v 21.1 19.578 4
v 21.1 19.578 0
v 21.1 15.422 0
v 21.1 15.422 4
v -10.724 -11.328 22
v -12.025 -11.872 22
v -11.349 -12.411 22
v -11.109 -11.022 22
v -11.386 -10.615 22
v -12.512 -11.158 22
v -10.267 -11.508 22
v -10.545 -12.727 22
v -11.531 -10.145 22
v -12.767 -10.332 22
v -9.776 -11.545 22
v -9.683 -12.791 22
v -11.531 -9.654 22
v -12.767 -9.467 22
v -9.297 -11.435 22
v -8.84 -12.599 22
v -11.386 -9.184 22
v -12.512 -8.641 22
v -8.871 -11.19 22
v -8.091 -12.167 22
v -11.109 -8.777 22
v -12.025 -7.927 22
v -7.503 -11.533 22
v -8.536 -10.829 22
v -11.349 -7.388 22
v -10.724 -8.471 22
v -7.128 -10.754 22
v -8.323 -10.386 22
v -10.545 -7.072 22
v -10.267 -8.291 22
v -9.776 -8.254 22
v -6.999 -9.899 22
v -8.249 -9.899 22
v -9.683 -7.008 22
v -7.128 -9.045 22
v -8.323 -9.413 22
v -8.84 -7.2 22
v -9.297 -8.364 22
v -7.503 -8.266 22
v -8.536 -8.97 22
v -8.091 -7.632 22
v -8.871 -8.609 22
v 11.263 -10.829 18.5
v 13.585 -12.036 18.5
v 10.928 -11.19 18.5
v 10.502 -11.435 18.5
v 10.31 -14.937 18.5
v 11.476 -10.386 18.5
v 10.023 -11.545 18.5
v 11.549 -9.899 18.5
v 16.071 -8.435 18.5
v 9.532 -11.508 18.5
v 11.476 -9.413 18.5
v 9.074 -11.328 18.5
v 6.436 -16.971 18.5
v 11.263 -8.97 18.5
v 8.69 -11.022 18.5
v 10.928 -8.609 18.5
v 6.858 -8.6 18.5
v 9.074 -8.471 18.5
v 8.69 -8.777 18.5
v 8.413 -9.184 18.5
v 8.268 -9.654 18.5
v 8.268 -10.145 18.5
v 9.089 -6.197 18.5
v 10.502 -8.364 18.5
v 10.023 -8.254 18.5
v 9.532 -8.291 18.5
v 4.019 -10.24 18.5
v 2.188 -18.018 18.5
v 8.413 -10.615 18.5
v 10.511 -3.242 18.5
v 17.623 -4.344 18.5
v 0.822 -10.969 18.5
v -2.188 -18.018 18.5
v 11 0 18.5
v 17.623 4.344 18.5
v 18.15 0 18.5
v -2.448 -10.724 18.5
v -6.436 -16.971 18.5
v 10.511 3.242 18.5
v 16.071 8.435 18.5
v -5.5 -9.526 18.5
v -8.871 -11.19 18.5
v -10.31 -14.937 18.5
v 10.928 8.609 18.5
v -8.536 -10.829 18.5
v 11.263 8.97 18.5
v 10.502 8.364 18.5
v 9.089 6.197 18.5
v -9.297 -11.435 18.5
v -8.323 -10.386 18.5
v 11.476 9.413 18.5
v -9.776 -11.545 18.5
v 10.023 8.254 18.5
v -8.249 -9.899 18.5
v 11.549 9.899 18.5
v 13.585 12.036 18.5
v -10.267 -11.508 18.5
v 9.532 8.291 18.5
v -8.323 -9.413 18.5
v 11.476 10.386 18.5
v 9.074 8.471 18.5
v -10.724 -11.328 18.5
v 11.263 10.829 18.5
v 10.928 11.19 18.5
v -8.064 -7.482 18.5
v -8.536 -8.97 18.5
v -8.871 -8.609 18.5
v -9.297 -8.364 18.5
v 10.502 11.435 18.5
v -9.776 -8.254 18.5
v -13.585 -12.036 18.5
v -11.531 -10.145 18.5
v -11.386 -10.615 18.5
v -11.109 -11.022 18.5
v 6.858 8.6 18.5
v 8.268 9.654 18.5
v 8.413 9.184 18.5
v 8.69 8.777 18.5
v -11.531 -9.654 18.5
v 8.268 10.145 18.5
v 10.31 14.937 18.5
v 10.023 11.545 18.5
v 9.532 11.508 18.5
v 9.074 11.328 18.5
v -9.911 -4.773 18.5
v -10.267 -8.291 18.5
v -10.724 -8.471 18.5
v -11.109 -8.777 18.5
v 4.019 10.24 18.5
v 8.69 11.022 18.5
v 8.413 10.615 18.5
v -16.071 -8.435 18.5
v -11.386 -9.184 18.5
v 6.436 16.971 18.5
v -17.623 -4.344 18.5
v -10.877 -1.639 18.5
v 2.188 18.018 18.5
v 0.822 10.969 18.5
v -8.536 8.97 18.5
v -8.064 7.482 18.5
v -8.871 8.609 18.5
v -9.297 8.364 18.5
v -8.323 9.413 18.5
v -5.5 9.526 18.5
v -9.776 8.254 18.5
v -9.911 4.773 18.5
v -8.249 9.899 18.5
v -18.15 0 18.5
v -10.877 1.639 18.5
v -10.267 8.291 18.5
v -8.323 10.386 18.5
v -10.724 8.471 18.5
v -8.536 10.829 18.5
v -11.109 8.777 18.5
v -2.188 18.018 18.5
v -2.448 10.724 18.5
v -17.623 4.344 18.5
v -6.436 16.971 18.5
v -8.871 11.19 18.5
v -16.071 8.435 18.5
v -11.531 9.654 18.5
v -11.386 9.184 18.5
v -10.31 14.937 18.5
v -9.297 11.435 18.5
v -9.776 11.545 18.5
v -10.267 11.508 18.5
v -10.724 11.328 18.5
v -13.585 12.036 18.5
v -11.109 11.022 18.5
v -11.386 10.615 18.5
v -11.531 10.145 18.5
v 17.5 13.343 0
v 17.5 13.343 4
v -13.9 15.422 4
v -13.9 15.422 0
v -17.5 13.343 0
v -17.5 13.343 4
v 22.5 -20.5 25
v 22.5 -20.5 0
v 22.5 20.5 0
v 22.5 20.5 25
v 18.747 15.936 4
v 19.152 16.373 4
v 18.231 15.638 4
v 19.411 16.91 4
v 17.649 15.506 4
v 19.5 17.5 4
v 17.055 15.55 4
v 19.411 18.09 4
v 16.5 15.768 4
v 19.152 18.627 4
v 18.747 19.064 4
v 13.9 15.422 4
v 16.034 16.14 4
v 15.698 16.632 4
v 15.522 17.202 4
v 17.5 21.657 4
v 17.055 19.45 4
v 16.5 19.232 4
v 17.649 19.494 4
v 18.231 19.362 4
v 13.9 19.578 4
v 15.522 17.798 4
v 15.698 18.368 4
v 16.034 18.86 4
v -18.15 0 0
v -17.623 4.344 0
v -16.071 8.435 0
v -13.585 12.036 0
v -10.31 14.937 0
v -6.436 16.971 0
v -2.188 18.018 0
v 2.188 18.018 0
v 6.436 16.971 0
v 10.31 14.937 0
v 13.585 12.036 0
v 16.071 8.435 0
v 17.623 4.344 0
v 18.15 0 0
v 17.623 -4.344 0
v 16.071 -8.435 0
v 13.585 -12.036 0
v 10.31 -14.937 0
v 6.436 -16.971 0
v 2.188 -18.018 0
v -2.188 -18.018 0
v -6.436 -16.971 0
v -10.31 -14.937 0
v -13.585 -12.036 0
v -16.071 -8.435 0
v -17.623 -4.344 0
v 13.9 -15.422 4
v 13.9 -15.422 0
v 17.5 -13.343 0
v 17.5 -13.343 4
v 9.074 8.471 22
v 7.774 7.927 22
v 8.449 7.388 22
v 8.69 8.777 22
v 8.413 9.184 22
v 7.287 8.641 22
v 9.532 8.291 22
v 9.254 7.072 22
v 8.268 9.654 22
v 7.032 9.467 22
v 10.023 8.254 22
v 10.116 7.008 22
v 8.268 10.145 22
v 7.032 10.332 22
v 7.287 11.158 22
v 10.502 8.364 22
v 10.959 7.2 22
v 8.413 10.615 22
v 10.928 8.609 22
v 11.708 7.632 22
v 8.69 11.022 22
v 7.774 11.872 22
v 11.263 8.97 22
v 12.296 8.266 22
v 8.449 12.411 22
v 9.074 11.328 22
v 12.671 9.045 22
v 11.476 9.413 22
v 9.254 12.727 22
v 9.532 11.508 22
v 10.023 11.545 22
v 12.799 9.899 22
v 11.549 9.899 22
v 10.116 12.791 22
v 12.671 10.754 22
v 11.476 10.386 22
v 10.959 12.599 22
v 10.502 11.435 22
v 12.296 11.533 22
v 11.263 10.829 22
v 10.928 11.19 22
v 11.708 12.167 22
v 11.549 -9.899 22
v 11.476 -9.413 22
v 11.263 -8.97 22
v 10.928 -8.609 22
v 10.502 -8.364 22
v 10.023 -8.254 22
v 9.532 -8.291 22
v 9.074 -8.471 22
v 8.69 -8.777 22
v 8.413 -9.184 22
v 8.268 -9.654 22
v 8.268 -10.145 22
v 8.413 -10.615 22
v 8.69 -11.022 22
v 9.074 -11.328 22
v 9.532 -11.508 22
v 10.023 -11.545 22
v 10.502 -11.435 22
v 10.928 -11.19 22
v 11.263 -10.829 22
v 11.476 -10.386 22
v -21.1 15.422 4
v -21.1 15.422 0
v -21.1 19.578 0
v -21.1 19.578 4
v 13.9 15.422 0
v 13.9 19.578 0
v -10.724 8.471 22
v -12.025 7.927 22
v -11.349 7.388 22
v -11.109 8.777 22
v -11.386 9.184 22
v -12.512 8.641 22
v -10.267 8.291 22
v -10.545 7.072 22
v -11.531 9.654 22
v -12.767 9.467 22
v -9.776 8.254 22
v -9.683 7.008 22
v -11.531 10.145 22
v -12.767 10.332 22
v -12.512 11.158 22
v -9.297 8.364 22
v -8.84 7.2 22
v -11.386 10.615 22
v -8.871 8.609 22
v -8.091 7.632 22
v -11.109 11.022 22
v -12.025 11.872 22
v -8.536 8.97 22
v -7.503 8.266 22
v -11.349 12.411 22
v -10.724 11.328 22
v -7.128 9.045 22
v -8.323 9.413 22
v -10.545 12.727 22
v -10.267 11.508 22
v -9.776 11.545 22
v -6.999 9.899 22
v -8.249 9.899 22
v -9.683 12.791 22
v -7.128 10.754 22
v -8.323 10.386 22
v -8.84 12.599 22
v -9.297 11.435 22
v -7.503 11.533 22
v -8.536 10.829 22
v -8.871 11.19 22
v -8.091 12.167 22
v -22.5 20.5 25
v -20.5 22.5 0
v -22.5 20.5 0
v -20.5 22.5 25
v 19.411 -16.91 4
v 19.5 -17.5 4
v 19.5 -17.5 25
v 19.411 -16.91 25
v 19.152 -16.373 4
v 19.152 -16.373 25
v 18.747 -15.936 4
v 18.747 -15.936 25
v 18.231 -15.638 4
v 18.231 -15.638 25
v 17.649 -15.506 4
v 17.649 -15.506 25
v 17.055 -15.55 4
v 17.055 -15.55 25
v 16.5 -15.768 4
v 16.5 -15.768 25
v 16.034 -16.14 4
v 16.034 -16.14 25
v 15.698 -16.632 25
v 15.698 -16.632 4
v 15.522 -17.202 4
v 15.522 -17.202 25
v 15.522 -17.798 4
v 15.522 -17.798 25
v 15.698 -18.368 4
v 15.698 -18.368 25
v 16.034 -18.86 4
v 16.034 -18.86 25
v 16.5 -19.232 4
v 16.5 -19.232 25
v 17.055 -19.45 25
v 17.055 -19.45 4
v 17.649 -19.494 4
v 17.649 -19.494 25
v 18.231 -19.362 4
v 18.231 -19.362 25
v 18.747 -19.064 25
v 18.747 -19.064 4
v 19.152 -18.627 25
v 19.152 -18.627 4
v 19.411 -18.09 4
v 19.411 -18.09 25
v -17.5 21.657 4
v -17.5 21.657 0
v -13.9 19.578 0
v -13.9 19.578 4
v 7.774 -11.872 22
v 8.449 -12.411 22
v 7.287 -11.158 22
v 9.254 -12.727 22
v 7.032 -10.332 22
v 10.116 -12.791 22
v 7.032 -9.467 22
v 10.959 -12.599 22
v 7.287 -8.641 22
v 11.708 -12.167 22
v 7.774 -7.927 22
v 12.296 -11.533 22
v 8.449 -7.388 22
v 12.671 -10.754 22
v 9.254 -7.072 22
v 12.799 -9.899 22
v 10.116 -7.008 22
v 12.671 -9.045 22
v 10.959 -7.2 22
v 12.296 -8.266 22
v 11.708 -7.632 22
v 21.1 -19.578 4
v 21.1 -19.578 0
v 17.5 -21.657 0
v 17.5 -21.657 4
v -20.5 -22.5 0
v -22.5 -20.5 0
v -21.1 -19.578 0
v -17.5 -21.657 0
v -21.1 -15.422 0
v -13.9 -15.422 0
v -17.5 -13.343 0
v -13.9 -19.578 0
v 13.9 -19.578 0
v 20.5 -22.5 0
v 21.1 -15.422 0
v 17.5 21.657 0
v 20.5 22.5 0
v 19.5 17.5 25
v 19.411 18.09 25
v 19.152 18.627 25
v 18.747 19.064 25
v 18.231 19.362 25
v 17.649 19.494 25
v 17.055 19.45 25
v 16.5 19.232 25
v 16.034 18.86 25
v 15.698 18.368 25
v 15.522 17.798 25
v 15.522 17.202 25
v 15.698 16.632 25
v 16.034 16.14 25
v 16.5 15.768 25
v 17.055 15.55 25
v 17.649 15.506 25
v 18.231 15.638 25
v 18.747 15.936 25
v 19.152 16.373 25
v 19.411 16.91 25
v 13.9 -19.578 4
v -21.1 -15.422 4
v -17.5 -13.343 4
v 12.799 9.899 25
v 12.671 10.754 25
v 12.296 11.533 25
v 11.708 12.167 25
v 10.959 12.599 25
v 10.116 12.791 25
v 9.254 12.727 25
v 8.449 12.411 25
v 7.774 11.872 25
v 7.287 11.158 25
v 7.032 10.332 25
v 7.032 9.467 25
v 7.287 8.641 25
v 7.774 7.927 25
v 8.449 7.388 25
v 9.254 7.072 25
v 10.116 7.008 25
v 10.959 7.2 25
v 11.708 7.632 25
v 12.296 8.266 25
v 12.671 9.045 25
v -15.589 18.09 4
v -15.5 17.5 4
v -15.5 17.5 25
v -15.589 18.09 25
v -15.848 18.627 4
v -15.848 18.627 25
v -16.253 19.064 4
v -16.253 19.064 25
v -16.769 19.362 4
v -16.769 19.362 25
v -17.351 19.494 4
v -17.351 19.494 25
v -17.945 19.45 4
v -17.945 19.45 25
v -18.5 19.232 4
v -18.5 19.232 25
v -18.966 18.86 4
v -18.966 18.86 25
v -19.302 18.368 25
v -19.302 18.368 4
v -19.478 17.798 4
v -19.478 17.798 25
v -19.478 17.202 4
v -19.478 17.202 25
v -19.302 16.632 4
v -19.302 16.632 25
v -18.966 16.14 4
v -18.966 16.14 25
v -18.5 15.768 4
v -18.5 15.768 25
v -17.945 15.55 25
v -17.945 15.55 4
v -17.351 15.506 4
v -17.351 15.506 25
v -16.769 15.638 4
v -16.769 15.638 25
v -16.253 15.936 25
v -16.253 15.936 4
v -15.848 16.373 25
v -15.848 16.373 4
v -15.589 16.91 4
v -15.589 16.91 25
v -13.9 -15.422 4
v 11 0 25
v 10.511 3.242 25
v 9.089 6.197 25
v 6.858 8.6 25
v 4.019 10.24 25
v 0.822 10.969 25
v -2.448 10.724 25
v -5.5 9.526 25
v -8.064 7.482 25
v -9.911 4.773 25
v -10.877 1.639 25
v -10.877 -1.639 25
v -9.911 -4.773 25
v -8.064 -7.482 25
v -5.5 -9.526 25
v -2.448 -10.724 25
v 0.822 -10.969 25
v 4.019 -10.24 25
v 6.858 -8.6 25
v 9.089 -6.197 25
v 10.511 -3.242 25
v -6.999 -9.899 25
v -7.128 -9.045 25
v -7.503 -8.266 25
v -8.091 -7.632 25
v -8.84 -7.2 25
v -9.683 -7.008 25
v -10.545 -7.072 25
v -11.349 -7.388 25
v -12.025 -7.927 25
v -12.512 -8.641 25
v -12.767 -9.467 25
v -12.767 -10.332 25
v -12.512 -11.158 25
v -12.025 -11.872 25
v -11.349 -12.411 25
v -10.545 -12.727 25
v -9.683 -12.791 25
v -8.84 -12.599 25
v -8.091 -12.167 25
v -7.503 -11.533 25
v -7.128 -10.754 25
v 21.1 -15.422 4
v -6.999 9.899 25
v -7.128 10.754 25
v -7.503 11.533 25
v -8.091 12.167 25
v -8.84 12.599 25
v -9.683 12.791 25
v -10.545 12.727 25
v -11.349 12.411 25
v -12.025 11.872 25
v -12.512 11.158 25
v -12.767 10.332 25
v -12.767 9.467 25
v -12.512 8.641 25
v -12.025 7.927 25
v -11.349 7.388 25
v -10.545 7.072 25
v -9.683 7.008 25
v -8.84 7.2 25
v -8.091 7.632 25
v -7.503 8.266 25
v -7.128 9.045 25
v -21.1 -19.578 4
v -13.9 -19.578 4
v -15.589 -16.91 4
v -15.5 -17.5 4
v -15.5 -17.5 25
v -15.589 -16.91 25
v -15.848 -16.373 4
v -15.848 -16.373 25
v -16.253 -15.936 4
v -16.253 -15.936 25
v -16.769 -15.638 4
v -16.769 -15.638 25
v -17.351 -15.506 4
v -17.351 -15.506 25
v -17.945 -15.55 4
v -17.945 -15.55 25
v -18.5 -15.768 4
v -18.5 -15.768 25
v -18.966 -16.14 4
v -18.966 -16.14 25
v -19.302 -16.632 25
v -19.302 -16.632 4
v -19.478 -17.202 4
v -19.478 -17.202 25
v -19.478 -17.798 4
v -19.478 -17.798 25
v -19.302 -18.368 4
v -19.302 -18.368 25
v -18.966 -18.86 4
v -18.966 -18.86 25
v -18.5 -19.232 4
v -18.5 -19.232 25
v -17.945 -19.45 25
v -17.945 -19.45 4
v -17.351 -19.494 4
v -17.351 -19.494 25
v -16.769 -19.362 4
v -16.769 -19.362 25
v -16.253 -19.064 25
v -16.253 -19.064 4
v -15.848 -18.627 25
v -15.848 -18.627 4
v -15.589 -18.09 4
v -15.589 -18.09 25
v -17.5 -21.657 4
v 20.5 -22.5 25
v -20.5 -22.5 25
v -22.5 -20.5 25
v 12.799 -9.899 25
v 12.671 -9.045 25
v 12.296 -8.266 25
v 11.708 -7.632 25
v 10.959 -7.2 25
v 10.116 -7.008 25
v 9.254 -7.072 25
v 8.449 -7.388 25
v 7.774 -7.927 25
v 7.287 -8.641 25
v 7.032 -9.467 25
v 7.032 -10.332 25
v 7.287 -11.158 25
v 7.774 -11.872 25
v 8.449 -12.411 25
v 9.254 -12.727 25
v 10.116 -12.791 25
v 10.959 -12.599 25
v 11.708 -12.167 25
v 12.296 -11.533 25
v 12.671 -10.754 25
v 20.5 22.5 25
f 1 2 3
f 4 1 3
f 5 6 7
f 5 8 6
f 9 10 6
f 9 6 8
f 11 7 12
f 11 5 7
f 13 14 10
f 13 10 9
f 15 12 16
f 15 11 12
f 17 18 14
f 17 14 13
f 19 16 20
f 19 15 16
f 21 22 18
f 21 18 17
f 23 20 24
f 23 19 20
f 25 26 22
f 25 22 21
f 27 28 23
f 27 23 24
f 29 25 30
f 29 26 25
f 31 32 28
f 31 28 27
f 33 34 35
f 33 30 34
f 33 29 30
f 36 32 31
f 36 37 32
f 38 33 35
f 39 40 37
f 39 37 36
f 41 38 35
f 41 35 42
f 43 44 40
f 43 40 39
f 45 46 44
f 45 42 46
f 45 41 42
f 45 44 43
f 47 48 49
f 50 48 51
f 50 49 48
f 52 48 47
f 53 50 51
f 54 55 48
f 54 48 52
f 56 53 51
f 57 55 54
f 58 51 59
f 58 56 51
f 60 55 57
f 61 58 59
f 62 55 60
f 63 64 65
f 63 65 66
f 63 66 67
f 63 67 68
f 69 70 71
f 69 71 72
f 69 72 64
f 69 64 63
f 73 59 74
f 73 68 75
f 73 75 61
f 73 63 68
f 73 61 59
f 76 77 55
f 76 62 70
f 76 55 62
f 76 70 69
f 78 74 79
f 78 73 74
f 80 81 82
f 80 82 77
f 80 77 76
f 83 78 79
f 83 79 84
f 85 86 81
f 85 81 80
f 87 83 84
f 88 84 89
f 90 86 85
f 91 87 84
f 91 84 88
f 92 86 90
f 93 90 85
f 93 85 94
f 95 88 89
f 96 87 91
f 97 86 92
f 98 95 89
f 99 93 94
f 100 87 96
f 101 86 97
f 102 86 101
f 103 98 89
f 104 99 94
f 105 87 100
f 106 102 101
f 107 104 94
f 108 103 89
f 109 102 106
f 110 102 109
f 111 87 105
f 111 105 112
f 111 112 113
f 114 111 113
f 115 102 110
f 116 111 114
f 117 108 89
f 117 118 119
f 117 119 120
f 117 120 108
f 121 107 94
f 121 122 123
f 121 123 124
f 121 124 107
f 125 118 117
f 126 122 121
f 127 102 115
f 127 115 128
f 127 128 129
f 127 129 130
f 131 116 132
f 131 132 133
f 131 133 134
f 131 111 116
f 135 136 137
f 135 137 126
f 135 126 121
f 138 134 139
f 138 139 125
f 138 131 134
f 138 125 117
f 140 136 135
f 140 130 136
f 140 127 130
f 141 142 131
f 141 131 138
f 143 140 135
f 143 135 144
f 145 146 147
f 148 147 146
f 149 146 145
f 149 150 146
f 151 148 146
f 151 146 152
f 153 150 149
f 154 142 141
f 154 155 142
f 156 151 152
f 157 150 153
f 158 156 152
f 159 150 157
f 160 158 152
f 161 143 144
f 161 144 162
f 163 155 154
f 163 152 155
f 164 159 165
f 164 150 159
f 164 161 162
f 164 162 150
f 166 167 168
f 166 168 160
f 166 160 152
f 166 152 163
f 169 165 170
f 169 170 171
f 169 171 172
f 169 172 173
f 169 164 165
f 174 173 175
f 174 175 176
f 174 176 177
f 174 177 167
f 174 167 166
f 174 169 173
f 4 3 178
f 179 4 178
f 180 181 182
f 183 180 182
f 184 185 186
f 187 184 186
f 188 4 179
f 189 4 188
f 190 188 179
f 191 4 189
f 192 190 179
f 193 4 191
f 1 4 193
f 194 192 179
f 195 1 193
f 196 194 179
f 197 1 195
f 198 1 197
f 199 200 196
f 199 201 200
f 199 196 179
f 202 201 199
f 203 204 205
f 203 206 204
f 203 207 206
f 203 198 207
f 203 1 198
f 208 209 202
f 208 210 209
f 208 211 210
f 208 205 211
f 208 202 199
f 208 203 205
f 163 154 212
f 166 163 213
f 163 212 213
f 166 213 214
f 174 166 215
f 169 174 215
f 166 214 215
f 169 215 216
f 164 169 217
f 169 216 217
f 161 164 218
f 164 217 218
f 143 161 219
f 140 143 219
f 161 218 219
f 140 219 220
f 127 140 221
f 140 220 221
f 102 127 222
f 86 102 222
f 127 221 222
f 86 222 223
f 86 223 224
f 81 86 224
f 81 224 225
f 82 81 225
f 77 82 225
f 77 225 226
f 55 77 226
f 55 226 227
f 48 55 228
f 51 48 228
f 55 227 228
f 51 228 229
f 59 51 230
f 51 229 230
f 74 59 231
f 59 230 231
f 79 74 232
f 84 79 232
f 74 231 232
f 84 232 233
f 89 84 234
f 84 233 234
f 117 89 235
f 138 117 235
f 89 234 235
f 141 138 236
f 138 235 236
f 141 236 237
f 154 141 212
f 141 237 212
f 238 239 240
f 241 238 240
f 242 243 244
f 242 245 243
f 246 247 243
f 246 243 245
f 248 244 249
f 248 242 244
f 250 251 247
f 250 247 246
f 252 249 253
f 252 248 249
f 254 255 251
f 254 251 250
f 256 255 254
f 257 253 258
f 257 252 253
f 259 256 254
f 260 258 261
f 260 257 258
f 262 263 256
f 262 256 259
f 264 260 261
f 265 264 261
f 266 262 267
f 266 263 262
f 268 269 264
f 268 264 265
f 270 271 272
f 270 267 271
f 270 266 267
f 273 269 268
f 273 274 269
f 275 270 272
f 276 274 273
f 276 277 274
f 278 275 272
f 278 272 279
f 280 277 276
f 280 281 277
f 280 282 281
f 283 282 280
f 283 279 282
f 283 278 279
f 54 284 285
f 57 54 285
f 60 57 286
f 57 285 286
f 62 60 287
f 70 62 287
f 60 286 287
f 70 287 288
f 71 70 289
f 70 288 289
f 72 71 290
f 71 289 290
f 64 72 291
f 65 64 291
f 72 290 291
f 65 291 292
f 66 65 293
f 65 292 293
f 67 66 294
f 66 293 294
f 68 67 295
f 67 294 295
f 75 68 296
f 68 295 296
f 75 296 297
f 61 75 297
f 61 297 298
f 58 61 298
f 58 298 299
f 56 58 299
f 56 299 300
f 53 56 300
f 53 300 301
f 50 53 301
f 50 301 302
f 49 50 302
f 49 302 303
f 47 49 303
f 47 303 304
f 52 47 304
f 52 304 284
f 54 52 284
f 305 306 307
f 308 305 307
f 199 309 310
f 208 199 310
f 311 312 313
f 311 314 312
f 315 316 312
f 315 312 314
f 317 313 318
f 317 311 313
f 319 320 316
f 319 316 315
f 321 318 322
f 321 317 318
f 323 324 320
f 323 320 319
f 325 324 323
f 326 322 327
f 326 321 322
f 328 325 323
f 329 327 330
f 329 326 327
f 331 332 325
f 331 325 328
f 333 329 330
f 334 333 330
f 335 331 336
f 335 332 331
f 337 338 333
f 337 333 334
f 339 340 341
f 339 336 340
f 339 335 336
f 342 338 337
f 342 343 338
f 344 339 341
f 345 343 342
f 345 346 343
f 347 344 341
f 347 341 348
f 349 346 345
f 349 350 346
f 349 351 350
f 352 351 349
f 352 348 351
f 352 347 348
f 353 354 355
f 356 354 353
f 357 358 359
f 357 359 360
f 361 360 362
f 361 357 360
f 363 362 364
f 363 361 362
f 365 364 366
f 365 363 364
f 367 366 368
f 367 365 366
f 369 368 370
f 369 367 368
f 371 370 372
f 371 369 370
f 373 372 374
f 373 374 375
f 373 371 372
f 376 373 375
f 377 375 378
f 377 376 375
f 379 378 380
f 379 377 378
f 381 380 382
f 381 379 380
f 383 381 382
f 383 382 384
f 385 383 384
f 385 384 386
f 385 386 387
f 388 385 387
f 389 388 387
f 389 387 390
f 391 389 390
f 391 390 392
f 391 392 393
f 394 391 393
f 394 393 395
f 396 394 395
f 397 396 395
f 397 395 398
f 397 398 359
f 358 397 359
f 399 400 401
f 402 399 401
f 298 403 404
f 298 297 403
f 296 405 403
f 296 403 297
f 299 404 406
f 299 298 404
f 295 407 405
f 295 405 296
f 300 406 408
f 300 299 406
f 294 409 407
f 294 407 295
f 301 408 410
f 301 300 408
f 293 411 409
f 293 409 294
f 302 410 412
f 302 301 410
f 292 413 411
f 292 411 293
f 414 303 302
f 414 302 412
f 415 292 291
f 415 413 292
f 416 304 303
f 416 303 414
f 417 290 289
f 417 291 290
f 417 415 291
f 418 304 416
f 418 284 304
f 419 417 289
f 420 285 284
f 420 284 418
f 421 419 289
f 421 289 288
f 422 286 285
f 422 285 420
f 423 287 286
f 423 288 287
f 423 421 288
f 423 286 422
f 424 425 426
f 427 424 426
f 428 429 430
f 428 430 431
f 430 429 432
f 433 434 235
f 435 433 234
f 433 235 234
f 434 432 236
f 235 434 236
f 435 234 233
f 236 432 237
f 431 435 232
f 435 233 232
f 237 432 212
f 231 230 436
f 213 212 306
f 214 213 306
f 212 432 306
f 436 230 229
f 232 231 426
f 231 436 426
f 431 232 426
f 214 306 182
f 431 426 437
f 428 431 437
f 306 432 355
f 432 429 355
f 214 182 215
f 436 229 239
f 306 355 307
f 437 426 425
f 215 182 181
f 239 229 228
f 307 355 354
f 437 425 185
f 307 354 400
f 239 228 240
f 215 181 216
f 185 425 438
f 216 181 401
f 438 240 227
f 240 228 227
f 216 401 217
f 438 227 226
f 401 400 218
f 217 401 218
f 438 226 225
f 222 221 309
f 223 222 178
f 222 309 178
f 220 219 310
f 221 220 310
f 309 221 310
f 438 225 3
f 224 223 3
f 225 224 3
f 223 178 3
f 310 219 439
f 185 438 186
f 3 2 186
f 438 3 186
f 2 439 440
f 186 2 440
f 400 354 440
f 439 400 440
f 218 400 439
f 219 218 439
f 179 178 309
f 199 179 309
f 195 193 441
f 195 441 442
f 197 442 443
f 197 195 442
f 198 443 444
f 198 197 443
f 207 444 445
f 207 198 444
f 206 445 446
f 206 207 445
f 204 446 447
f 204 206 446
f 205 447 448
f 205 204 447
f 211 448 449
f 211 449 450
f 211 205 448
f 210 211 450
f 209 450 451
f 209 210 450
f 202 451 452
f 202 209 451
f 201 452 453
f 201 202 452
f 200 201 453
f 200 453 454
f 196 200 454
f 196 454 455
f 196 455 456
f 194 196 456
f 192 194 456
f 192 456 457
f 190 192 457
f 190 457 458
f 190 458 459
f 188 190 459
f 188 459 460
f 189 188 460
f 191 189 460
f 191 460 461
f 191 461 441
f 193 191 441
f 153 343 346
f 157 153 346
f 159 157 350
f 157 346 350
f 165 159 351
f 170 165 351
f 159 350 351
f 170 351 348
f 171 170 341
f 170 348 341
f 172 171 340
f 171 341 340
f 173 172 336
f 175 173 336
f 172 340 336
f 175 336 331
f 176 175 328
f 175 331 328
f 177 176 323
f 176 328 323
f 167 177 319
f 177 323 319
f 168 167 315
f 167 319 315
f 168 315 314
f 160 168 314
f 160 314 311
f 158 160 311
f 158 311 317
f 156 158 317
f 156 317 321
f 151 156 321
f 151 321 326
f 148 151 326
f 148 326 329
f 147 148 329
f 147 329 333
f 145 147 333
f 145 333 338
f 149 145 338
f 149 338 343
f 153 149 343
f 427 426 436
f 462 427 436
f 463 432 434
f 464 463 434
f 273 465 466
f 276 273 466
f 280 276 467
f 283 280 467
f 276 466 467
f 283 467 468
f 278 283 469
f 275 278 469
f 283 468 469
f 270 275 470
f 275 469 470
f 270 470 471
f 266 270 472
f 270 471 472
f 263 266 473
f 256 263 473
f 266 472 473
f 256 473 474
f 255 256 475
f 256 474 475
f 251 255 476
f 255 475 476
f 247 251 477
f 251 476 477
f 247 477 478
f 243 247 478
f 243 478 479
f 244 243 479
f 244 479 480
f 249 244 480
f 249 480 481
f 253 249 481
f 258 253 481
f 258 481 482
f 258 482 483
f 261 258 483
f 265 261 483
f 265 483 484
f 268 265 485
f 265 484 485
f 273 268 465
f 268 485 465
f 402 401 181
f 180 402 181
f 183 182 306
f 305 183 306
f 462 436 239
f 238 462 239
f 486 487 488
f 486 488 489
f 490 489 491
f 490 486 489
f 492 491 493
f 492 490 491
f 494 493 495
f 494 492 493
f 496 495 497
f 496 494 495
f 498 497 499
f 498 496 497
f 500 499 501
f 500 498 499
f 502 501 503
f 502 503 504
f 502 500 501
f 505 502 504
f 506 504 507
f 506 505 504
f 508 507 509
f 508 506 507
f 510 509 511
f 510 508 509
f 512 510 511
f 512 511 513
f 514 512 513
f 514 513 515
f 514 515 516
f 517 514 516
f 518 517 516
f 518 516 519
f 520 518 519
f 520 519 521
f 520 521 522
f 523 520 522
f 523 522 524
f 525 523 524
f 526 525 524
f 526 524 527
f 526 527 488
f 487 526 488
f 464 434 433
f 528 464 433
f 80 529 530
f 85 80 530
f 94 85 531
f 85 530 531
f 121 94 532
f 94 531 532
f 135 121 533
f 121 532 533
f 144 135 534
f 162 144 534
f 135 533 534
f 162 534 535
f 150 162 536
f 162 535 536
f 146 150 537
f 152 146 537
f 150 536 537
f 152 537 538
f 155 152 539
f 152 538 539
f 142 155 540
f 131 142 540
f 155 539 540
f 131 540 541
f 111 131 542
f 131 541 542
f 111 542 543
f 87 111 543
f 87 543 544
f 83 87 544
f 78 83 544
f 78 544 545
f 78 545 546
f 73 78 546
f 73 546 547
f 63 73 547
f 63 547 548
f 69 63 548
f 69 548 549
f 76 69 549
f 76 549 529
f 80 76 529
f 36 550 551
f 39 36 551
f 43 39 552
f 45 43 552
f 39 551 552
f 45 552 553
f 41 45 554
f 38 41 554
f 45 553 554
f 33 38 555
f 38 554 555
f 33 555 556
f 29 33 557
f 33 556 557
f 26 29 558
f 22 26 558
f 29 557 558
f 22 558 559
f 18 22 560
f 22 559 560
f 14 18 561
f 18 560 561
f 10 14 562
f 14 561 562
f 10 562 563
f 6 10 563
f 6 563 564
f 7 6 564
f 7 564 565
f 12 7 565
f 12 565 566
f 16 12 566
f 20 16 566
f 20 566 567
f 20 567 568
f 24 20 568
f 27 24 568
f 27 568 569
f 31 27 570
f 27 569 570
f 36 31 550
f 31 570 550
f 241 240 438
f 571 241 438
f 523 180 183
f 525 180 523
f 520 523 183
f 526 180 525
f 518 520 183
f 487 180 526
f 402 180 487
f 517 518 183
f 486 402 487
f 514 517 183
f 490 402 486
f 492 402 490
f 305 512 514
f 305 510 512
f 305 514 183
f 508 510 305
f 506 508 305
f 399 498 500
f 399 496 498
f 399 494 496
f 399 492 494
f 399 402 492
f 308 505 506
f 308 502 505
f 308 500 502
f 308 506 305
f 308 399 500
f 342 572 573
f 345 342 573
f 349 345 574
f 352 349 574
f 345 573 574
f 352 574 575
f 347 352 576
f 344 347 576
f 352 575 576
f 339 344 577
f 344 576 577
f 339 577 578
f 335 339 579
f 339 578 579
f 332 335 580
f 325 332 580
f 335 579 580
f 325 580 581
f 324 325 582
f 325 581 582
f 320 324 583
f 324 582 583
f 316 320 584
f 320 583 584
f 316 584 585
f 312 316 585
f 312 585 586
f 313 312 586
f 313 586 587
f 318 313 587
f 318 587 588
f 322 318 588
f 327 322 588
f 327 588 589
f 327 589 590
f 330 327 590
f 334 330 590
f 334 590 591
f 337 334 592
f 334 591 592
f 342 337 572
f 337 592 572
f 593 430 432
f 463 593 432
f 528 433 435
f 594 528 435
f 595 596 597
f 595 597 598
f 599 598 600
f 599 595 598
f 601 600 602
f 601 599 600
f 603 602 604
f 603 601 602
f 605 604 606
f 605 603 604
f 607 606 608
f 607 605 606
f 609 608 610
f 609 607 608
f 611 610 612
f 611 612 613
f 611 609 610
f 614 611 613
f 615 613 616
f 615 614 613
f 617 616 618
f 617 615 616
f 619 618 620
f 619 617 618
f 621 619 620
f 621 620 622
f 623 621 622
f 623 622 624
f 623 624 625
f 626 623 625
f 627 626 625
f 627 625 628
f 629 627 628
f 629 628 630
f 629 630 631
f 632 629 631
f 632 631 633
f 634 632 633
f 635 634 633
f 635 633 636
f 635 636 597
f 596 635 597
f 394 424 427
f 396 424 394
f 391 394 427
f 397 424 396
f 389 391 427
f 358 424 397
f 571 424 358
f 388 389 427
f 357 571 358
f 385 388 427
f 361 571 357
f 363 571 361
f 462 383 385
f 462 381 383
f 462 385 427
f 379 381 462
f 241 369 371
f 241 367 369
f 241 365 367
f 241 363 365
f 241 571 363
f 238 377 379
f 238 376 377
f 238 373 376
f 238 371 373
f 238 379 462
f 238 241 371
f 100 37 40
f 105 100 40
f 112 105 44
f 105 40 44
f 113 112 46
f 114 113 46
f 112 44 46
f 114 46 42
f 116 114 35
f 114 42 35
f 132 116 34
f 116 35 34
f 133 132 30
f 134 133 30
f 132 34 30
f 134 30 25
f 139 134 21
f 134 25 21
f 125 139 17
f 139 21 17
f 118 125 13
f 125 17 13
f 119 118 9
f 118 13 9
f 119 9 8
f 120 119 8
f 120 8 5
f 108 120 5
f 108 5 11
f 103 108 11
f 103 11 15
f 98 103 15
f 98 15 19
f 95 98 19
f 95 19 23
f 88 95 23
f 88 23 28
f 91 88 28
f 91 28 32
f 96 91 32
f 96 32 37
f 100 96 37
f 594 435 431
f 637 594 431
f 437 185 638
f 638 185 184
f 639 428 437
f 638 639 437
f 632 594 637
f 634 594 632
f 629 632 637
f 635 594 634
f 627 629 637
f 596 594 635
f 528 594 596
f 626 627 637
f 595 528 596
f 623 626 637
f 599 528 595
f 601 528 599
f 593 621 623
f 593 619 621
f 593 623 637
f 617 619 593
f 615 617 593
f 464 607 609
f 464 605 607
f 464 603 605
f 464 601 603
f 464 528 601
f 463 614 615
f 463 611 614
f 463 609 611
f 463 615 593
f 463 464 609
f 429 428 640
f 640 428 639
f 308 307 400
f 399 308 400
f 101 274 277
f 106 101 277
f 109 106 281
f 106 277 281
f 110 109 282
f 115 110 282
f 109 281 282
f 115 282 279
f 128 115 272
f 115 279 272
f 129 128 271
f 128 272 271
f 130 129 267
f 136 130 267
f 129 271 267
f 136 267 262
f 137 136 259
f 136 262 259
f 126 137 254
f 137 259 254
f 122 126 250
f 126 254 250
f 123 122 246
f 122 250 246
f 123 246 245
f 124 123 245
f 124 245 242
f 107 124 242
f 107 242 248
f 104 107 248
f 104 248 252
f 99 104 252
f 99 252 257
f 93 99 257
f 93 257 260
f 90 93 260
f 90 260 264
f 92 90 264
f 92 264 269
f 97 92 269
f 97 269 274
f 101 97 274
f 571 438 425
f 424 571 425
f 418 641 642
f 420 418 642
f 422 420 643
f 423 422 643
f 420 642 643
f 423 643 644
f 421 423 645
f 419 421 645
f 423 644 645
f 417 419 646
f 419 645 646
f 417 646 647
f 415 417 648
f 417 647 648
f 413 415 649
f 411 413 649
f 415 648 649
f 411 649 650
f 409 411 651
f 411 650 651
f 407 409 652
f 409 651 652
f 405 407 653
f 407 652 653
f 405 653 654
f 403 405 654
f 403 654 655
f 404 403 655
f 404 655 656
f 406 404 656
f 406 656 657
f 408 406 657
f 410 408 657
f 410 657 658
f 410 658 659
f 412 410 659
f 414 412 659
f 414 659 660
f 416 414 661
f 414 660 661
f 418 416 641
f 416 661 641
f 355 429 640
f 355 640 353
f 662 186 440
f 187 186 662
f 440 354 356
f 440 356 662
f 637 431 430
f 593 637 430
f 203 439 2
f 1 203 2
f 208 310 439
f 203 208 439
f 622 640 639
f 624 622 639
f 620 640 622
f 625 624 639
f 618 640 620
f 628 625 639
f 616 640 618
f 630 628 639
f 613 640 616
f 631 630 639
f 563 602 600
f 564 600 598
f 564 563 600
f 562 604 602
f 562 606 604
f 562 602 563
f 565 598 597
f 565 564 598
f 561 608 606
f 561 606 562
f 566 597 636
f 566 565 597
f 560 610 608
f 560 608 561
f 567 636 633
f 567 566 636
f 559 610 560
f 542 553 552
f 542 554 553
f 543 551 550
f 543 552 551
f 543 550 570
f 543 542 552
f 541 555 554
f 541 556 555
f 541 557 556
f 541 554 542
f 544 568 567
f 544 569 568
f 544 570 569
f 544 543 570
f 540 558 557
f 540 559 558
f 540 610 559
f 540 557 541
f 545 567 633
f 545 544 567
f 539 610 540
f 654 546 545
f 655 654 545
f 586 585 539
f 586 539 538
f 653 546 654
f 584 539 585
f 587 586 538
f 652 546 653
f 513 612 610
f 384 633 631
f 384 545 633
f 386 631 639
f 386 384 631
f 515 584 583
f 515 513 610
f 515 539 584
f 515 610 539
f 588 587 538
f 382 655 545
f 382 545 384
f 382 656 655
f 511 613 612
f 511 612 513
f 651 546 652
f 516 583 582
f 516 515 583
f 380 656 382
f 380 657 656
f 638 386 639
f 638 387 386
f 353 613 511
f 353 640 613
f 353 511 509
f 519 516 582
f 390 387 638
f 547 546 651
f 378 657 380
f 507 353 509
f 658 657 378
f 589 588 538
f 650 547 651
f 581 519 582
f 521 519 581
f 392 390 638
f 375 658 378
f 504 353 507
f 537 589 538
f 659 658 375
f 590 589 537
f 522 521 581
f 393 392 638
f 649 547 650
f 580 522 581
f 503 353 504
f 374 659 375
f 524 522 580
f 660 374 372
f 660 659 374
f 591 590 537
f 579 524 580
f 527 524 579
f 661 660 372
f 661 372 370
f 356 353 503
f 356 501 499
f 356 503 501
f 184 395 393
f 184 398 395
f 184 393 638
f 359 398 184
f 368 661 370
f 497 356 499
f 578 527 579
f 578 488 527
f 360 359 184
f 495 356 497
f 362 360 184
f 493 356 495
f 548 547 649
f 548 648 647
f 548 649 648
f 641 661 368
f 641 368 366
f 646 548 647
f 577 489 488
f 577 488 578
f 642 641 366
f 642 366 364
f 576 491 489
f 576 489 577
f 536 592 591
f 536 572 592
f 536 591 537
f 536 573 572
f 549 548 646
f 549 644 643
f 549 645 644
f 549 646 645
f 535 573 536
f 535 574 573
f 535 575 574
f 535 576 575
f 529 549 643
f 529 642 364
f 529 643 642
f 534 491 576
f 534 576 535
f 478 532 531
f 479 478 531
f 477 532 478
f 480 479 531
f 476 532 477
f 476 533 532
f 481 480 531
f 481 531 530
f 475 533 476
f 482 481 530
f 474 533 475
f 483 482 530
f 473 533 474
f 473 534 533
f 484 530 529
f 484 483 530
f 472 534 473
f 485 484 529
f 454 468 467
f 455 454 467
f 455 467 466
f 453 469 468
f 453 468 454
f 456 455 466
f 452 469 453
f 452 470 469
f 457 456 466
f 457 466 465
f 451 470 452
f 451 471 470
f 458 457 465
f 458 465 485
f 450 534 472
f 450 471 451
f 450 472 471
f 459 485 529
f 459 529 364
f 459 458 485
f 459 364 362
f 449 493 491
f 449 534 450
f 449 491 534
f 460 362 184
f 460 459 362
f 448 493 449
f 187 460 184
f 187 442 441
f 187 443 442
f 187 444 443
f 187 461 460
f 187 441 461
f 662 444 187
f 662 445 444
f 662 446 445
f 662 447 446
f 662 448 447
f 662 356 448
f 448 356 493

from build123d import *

# Parameters (mm, degrees)
SKETCH1_W            = 45
SKETCH1_H            = 45
SKETCH1_R            = 2
BOSS_EXTRUDE1_DEPTH  = 25
SKETCH2_R            = 1.65
SKETCH2_R_2          = 11
CUT_EXTRUDE1_DEPTH   = 25
SKETCH3_R            = 2.9
CUT_EXTRUDE2_DEPTH   = 3
CHAMFER1_SIZE        = 2
SKETCH4_R            = 18.15
CUT_EXTRUDE3_DEPTH   = 18.5
SKETCH_4_R           = 2
CUT_EXTRUDE_10_DEPTH = 4


with BuildPart() as part:
    # Sketch1 → Boss-Extrude1 (new body)
    with BuildSketch(Plane.XY):
        Rectangle(SKETCH1_W, SKETCH1_H)
        with Locations((-17.5, 17.5)):
            Circle(SKETCH1_R, mode=Mode.SUBTRACT)
        with Locations((17.5, 17.5)):
            Circle(SKETCH1_R, mode=Mode.SUBTRACT)
        with Locations((17.5, -17.5)):
            Circle(SKETCH1_R, mode=Mode.SUBTRACT)
        with Locations((-17.5, -17.5)):
            Circle(SKETCH1_R, mode=Mode.SUBTRACT)
    extrude(amount=BOSS_EXTRUDE1_DEPTH)

    # Sketch2 → Cut-Extrude1 (cut)
    with BuildSketch(Plane.XY.offset(25)):
        with Locations((9.899494937, 9.899494937)):
            Circle(SKETCH2_R)
        with Locations((9.899494937, -9.899494937)):
            Circle(SKETCH2_R)
        with Locations((-9.899494937, -9.899494937)):
            Circle(SKETCH2_R)
        with Locations((-9.899494937, 9.899494937)):
            Circle(SKETCH2_R)
        Circle(SKETCH2_R_2)
    extrude(amount=-CUT_EXTRUDE1_DEPTH, mode=Mode.SUBTRACT)

    # Sketch3 → Cut-Extrude2 (cut)
    with BuildSketch(Plane.XY.offset(25)):
        with Locations((9.899494937, 9.899494937)):
            Circle(SKETCH3_R)
        with Locations((9.899494937, -9.899494937)):
            Circle(SKETCH3_R)
        with Locations((-9.899494937, -9.899494937)):
            Circle(SKETCH3_R)
        with Locations((-9.899494937, 9.899494937)):
            Circle(SKETCH3_R)
    extrude(amount=-CUT_EXTRUDE2_DEPTH, mode=Mode.SUBTRACT)

    # Chamfer1
    chamfer1_edges = [part.edges().sort_by_distance(p)[0] for p in [
        (22.5, -22.5, 12.5),
        (-22.5, -22.5, 12.5),
        (-22.5, 22.5, 12.5),
        (22.5, 22.5, 12.5),
    ]]
    chamfer(chamfer1_edges, length=CHAMFER1_SIZE)

    # Sketch4 → Cut-Extrude3 (cut)
    with BuildSketch(Plane(origin=(0, 0, 0), x_dir=(-1, 0, 0), z_dir=(0, 0, -1))):
        Circle(SKETCH4_R)
    extrude(amount=-CUT_EXTRUDE3_DEPTH, mode=Mode.SUBTRACT)

    # 草图4 → 切除-拉伸10 (cut)
    with BuildSketch(Plane(origin=(0, 0, 0), x_dir=(-1, 0, 0), z_dir=(0, 0, -1))):
        Polygon((13.9, 19.578460969), (13.9, 15.421539031), (17.5, 13.343078062), (21.1, 15.421539031), (21.1, 19.578460969), (17.5, 21.656921938), align=None)
        with Locations((17.5, 17.5)):
            Circle(SKETCH_4_R, mode=Mode.SUBTRACT)
        Polygon((-21.1, 19.578460969), (-21.1, 15.421539031), (-17.5, 13.343078062), (-13.9, 15.421539031), (-13.9, 19.578460969), (-17.5, 21.656921938), align=None)
        with Locations((-17.5, 17.5)):
            Circle(SKETCH_4_R, mode=Mode.SUBTRACT)
        Polygon((-21.1, -15.421539031), (-21.1, -19.578460969), (-17.5, -21.656921938), (-13.9, -19.578460969), (-13.9, -15.421539031), (-17.5, -13.343078062), align=None)
        with Locations((-17.5, -17.5)):
            Circle(SKETCH_4_R, mode=Mode.SUBTRACT)
        Polygon((13.9, -15.421539031), (13.9, -19.578460969), (17.5, -21.656921938), (21.1, -19.578460969), (21.1, -15.421539031), (17.5, -13.343078062), align=None)
        with Locations((17.5, -17.5)):
            Circle(SKETCH_4_R, mode=Mode.SUBTRACT)
    extrude(amount=-CUT_EXTRUDE_10_DEPTH, mode=Mode.SUBTRACT)


solid = part.part
